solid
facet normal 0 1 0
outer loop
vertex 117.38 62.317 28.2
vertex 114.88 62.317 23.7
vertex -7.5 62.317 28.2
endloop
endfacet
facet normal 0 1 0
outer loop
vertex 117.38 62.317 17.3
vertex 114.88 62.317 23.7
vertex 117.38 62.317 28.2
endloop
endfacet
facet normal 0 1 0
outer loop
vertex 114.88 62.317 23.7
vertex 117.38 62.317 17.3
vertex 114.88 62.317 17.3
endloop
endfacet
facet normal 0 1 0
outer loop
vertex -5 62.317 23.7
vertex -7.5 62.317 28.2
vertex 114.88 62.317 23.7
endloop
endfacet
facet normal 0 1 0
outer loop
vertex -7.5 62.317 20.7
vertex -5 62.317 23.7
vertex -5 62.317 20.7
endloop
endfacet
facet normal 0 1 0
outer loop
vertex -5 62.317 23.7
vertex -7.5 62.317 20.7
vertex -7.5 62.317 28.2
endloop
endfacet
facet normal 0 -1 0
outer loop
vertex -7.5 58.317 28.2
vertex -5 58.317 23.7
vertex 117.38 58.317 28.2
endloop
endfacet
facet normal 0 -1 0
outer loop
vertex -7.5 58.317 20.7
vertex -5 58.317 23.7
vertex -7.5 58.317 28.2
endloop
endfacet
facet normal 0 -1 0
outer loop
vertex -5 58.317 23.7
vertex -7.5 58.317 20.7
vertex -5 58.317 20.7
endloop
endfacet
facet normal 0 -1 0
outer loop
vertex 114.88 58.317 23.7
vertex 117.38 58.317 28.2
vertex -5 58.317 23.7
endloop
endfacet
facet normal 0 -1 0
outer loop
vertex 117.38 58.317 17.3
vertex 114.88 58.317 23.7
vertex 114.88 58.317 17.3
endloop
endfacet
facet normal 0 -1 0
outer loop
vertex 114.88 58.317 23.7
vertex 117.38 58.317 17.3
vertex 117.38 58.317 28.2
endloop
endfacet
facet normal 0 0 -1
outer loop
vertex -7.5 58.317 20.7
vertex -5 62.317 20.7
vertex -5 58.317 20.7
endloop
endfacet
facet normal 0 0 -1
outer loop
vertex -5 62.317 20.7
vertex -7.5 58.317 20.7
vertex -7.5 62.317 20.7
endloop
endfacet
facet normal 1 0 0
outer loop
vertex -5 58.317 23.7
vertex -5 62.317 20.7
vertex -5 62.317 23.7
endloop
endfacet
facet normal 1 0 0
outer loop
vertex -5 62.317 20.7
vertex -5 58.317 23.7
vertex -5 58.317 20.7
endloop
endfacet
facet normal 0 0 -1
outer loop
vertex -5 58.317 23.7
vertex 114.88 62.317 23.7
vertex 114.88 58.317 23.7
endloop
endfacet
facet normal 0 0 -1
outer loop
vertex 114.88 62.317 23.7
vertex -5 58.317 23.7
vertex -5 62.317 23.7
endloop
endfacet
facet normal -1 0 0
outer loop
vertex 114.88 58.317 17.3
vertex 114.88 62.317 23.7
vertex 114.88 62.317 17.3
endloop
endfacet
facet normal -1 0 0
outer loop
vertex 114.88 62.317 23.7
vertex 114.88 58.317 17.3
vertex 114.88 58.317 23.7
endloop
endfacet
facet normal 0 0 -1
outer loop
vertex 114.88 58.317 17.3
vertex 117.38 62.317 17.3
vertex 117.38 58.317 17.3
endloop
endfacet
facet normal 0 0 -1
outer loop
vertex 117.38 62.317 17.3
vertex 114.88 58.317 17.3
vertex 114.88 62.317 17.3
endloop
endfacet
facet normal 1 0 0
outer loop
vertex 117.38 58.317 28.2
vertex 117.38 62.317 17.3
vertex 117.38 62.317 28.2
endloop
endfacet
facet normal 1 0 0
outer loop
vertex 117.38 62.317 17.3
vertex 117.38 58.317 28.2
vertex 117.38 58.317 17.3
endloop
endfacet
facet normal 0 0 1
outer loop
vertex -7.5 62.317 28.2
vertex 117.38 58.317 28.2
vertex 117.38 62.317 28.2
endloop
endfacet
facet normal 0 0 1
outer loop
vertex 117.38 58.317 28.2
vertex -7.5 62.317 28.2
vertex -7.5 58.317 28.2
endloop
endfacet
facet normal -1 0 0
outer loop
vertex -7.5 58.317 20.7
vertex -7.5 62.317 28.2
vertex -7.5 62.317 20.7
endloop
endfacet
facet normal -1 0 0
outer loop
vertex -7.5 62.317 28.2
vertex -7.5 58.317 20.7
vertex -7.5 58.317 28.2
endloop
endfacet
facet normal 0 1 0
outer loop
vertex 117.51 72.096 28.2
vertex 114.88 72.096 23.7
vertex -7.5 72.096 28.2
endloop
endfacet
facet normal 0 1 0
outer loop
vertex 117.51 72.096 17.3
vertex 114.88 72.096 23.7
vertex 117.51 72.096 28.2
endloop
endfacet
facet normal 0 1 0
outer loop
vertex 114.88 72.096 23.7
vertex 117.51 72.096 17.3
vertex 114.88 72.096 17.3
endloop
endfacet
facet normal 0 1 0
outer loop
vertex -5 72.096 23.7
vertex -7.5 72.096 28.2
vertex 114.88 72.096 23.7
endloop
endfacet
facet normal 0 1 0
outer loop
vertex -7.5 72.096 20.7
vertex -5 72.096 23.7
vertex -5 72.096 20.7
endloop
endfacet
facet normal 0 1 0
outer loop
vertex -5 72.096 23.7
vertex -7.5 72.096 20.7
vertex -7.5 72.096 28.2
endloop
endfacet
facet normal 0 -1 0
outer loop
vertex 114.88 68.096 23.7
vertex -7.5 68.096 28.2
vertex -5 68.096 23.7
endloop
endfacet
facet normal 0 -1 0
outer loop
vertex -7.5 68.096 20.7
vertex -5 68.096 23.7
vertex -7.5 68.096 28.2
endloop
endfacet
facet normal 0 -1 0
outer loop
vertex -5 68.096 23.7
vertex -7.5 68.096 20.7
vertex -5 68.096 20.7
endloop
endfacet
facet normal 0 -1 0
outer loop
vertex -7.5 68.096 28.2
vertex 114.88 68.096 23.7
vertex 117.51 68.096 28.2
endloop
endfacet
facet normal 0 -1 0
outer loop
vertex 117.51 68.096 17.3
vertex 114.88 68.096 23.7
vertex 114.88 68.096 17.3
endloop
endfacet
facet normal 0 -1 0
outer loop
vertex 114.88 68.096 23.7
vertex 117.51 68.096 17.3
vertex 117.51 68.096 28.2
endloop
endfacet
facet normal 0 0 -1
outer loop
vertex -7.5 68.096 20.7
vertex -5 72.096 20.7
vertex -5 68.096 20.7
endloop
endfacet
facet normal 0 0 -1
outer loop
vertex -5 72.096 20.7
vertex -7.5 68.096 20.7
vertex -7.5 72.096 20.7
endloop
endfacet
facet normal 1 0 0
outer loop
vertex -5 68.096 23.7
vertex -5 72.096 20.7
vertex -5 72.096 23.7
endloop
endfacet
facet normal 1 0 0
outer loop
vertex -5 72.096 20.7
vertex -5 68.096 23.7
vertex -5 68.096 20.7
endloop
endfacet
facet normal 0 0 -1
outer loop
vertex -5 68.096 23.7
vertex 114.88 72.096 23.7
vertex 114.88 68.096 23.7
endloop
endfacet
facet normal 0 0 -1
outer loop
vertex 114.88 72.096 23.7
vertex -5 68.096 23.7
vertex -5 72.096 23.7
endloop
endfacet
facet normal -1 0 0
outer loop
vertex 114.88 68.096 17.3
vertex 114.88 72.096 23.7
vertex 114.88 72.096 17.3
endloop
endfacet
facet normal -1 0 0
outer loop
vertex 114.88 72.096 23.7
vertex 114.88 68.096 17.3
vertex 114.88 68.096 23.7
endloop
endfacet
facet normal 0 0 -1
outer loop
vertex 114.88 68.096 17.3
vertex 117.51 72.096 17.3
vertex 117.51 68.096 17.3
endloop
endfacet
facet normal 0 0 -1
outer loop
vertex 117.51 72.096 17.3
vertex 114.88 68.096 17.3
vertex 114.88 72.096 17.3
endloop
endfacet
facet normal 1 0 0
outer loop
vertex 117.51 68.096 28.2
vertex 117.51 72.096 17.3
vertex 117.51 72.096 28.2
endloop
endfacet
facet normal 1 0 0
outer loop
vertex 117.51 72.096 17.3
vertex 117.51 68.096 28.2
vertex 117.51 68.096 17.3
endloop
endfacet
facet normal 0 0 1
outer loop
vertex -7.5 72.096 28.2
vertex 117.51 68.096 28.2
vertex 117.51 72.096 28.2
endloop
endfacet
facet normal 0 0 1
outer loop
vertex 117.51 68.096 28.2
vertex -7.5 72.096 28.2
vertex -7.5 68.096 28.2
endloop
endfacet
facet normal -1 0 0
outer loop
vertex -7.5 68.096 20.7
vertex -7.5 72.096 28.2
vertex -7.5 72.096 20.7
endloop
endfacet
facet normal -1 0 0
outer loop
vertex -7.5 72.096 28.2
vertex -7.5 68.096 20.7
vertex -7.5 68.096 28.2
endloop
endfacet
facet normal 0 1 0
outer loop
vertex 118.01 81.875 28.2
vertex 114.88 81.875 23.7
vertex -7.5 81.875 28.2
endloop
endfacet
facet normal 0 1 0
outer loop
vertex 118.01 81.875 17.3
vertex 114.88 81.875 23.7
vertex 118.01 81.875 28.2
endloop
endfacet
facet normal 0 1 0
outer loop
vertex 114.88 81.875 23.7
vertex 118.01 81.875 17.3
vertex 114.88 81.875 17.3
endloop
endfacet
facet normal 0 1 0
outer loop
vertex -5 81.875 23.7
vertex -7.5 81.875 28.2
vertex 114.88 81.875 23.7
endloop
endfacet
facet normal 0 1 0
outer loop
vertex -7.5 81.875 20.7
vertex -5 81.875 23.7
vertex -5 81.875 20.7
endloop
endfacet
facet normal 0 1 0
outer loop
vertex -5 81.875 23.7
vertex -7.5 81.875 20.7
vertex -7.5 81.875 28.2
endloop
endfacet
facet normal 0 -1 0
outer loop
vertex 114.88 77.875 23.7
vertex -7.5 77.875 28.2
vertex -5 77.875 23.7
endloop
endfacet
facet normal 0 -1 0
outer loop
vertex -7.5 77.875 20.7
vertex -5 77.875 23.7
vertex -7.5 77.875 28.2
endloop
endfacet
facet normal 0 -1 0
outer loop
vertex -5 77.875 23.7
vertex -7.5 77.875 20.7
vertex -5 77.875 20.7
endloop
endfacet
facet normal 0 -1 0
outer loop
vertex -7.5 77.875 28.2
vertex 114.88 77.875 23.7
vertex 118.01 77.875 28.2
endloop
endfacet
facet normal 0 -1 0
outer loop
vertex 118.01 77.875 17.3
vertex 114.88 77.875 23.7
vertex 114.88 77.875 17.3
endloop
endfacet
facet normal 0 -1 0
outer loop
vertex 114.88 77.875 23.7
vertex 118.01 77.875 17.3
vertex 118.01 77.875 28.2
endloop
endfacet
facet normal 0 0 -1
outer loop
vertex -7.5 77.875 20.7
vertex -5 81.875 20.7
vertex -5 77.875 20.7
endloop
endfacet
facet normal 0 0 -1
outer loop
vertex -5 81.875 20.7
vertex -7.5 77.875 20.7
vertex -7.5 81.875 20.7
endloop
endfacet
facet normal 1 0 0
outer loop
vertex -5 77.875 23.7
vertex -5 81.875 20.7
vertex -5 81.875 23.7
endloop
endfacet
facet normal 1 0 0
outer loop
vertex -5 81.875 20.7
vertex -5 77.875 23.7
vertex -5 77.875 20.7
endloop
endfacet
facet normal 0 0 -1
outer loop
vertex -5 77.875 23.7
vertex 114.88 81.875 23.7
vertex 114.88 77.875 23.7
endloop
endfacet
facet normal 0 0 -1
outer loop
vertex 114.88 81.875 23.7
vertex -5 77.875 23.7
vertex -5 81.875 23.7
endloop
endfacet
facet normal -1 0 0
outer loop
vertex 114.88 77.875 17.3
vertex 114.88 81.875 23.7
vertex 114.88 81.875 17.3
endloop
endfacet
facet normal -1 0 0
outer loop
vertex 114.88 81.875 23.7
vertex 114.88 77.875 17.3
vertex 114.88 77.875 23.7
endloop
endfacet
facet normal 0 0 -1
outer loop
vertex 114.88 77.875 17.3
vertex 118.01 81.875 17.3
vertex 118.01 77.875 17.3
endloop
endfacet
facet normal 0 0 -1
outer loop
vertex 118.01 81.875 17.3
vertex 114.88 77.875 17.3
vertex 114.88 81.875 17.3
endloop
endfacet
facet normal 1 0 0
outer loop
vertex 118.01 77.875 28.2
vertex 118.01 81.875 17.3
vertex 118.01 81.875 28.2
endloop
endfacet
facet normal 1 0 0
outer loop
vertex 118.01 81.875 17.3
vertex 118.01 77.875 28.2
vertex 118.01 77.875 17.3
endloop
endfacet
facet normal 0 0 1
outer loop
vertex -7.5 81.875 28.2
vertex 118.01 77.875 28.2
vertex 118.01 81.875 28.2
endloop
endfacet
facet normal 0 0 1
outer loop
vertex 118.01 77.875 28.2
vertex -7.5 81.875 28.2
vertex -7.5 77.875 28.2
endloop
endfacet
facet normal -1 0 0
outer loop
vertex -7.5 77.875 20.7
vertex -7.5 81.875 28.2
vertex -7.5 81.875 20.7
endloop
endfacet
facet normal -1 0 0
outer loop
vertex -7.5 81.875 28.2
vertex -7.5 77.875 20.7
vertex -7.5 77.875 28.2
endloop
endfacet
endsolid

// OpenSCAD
// TailWatch S3 enclosure -- button_rods (all 3: DN, UP, RST), ASSEMBLY position.
include <../tailwatch_lib.scad>
on_board() for (b = mp_buttons) rod_raw(b);
